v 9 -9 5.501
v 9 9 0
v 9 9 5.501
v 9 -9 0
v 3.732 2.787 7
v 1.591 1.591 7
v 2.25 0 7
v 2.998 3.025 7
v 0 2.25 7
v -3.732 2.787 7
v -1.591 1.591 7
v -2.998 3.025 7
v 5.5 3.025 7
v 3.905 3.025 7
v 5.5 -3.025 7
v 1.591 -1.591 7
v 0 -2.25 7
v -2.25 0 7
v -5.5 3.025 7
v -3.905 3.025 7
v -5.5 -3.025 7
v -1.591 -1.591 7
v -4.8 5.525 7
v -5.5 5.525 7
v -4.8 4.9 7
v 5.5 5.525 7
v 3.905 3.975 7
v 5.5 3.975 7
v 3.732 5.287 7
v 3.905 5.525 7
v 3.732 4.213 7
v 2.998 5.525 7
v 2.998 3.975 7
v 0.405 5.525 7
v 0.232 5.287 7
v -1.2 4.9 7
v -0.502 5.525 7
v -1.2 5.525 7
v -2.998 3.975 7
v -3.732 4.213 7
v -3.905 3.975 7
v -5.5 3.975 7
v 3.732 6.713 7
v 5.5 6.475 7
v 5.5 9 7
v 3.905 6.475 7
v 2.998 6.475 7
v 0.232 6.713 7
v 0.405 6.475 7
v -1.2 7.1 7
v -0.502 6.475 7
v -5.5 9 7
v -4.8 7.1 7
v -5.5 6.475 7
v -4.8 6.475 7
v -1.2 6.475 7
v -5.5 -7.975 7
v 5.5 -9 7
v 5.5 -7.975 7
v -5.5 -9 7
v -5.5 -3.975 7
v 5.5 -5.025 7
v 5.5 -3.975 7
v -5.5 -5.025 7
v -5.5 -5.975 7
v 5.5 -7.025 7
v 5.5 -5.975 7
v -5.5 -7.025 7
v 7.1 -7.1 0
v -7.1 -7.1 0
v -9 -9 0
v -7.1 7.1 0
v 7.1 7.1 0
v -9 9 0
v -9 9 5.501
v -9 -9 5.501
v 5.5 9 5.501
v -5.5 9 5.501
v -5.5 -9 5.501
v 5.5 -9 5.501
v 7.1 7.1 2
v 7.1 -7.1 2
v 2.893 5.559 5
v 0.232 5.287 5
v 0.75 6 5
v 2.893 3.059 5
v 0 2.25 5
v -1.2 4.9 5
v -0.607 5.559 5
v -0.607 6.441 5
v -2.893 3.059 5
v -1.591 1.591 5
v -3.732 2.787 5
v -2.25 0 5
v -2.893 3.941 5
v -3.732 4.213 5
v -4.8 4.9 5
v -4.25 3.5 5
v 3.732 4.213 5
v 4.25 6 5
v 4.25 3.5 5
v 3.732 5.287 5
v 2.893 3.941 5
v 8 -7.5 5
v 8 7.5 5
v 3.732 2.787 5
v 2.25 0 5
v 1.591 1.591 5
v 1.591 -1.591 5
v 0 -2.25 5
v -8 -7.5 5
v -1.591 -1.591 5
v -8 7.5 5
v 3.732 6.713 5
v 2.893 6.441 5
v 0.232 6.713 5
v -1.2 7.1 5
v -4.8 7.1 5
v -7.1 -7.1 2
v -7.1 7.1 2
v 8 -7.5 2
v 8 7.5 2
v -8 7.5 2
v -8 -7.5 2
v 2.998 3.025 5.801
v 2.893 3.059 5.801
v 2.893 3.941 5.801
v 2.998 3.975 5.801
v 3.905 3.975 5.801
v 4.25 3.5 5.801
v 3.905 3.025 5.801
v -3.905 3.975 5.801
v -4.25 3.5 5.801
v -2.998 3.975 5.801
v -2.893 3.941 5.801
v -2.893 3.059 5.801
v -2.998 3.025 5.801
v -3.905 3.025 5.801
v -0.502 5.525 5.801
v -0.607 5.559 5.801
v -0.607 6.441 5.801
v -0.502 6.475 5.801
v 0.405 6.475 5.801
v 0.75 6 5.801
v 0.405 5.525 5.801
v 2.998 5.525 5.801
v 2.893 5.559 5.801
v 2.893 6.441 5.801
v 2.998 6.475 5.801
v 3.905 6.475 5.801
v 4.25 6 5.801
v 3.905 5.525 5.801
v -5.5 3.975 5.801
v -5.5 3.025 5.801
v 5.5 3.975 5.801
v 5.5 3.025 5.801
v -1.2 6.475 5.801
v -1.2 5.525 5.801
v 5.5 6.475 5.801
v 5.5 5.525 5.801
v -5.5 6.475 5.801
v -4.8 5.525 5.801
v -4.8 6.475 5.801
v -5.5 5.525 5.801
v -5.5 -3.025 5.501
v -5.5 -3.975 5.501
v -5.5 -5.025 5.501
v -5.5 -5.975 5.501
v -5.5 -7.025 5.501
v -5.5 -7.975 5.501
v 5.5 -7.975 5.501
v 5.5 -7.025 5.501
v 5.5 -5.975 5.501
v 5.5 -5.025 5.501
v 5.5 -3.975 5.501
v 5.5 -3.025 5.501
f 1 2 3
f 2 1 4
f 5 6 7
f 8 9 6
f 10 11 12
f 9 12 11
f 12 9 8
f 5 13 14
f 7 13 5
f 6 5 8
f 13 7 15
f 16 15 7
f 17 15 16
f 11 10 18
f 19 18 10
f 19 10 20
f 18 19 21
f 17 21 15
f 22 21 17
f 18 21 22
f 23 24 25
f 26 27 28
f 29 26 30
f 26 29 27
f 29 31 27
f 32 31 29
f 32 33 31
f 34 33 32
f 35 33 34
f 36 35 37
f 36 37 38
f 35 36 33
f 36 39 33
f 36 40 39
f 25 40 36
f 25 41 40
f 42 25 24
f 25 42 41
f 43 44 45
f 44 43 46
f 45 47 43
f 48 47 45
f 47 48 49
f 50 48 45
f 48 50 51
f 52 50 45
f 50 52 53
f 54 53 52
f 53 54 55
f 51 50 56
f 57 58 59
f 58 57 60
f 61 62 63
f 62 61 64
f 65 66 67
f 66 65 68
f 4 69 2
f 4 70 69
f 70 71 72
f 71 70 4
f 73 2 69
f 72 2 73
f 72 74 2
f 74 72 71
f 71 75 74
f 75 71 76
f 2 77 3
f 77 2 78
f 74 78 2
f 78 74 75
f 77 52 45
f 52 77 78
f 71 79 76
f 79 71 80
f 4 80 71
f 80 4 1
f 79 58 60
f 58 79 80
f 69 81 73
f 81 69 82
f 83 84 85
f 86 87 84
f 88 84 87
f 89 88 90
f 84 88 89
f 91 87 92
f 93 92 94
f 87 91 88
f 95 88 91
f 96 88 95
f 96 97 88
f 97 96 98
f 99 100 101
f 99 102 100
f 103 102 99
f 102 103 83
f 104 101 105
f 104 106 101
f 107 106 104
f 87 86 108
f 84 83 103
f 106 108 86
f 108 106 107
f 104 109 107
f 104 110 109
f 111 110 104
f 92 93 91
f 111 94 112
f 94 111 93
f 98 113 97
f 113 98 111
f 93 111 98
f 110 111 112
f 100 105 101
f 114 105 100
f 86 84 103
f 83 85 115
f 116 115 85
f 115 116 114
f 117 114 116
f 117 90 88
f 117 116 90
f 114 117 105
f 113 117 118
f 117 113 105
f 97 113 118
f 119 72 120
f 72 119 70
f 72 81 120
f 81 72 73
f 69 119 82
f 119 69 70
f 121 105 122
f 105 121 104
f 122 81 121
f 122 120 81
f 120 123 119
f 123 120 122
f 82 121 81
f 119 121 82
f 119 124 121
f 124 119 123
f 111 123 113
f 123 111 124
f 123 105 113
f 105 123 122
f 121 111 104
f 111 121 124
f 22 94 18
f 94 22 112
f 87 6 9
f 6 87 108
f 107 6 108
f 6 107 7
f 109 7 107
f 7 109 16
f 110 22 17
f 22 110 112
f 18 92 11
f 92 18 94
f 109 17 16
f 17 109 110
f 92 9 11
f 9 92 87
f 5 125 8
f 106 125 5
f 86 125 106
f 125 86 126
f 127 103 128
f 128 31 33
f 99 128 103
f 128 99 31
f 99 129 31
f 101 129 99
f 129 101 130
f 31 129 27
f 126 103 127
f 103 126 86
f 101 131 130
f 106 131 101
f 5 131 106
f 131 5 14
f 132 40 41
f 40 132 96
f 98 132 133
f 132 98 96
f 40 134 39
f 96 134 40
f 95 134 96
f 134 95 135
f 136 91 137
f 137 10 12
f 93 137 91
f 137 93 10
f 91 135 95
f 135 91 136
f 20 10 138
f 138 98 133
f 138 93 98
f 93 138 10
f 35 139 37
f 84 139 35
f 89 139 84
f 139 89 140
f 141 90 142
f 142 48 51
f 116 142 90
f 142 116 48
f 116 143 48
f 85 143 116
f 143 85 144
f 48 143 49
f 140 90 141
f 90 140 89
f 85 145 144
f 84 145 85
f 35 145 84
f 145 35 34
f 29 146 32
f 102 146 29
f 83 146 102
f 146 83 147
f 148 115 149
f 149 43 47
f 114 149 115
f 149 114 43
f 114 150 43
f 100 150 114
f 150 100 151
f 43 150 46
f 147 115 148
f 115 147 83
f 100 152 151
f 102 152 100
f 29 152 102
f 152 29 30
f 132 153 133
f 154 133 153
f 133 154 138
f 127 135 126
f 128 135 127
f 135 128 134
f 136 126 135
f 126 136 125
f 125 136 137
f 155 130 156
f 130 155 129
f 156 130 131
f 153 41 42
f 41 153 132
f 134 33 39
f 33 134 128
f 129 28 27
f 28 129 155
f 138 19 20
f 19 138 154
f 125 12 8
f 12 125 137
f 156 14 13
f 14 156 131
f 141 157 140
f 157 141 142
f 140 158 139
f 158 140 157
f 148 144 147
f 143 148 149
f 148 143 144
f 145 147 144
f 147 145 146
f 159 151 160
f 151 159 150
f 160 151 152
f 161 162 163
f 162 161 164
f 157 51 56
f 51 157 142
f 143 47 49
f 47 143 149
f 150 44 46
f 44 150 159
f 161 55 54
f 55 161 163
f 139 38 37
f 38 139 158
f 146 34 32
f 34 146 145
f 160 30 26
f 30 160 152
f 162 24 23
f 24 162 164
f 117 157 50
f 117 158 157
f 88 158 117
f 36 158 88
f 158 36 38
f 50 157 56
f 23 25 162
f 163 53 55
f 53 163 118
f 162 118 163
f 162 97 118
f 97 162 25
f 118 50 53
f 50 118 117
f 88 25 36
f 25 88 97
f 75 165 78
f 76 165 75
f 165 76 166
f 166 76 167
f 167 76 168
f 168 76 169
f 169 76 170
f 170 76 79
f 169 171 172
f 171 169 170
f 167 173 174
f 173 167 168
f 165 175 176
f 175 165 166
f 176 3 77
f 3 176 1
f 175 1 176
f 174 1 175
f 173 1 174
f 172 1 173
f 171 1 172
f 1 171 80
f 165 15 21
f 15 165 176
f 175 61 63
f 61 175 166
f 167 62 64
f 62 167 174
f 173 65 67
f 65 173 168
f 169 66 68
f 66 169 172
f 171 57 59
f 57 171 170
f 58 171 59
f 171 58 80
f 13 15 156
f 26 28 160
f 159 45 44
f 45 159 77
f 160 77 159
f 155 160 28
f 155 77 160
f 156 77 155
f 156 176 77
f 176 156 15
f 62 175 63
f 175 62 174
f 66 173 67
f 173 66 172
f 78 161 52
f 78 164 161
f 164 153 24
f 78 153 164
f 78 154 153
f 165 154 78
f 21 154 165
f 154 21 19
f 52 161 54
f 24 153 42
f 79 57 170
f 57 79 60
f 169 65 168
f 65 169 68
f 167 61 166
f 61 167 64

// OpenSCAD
key_higth = 7;
// Switch mount point
mount_dims = [18, 18, key_higth];
mount_pos = [0, 0, 0];

// Switch hole
hole_dims = [14.2, 14.2, 5];
hole_pos = [0, 0, 0];

// Install *change_name
install_dims = [16,15,3];
install_pos = [0,0,2];

// Round holes
stem_dims = [key_higth, 4.5];
stem_pos = [0, 0, 0];

// Pin holes
pin_dims = [key_higth, 1.5];
pin_1_pos = [3.5, 3.5, 0];
pin_2_pos = [0, 6, 0];
pin_3_pos = [3.5, 6, 0];

// Tranches for wires
tranch_width = 0.95;
tranch_depth = 1.2;
tranch_dims = [mount_dims.x, tranch_width, tranch_depth];
tranch_1_pos = [0, pin_1_pos.y, key_higth - tranch_depth+0.001];
tranch_2_pos = [0, pin_2_pos.y, key_higth - tranch_depth+0.001];

// Diod hole 
diod_dims = [3.6, 2.2, 2.2];
diod_pos = [-3, pin_2_pos.y, key_higth - diod_dims.z];

// Wires
wire_width = 0.95;
wire_depth = 1.5;
wire_dim = [mount_dims.x, wire_width, wire_depth];
wire_1_pos = [0,-3.5, key_higth-wire_depth+0.001];
wire_2_pos = [0,-5.5, key_higth-wire_depth+0.001];
wire_3_pos = [0,-7.5, key_higth-wire_depth+0.001];

//Solider space
space_depth = wire_depth;
space_dims = [4,mount_dims.y, space_depth];
space_pos = [mount_dims.x/2 - 1.5, 0, key_higth - space_depth+0.001];

module center_cube(cube_dims, cube_pos){
    translate([cube_pos.x, cube_pos.y, cube_pos.z + cube_dims.z / 2])cube(cube_dims, center=true);
}
//
module center_cylinder(cylinder_dims,cylinder_pos){
    translate([cylinder_pos.x, cylinder_pos.y, cylinder_pos.z + cylinder_dims.x / 2])cylinder(h = cylinder_dims.x, d = cylinder_dims.y, center=true);
}
//
difference(){
    center_cube(mount_dims, mount_pos);
    center_cube(hole_dims, hole_pos);
    center_cube(install_dims, install_pos);
    center_cylinder(stem_dims,stem_pos);
    center_cylinder(pin_dims, pin_1_pos);
    mirror([1,0,0])center_cylinder(pin_dims, pin_1_pos);
    center_cylinder(pin_dims, pin_2_pos);
    center_cylinder(pin_dims, pin_3_pos);
    center_cube(tranch_dims, tranch_1_pos);
    center_cube(tranch_dims, tranch_2_pos);
    center_cube(diod_dims, diod_pos);
    center_cube(wire_dim, wire_1_pos);
    center_cube(wire_dim, wire_2_pos);
    center_cube(wire_dim, wire_3_pos);
    center_cube(space_dims, space_pos);
    mirror([1,0,0]){
        center_cube(space_dims, space_pos);
        }
    
}
//
